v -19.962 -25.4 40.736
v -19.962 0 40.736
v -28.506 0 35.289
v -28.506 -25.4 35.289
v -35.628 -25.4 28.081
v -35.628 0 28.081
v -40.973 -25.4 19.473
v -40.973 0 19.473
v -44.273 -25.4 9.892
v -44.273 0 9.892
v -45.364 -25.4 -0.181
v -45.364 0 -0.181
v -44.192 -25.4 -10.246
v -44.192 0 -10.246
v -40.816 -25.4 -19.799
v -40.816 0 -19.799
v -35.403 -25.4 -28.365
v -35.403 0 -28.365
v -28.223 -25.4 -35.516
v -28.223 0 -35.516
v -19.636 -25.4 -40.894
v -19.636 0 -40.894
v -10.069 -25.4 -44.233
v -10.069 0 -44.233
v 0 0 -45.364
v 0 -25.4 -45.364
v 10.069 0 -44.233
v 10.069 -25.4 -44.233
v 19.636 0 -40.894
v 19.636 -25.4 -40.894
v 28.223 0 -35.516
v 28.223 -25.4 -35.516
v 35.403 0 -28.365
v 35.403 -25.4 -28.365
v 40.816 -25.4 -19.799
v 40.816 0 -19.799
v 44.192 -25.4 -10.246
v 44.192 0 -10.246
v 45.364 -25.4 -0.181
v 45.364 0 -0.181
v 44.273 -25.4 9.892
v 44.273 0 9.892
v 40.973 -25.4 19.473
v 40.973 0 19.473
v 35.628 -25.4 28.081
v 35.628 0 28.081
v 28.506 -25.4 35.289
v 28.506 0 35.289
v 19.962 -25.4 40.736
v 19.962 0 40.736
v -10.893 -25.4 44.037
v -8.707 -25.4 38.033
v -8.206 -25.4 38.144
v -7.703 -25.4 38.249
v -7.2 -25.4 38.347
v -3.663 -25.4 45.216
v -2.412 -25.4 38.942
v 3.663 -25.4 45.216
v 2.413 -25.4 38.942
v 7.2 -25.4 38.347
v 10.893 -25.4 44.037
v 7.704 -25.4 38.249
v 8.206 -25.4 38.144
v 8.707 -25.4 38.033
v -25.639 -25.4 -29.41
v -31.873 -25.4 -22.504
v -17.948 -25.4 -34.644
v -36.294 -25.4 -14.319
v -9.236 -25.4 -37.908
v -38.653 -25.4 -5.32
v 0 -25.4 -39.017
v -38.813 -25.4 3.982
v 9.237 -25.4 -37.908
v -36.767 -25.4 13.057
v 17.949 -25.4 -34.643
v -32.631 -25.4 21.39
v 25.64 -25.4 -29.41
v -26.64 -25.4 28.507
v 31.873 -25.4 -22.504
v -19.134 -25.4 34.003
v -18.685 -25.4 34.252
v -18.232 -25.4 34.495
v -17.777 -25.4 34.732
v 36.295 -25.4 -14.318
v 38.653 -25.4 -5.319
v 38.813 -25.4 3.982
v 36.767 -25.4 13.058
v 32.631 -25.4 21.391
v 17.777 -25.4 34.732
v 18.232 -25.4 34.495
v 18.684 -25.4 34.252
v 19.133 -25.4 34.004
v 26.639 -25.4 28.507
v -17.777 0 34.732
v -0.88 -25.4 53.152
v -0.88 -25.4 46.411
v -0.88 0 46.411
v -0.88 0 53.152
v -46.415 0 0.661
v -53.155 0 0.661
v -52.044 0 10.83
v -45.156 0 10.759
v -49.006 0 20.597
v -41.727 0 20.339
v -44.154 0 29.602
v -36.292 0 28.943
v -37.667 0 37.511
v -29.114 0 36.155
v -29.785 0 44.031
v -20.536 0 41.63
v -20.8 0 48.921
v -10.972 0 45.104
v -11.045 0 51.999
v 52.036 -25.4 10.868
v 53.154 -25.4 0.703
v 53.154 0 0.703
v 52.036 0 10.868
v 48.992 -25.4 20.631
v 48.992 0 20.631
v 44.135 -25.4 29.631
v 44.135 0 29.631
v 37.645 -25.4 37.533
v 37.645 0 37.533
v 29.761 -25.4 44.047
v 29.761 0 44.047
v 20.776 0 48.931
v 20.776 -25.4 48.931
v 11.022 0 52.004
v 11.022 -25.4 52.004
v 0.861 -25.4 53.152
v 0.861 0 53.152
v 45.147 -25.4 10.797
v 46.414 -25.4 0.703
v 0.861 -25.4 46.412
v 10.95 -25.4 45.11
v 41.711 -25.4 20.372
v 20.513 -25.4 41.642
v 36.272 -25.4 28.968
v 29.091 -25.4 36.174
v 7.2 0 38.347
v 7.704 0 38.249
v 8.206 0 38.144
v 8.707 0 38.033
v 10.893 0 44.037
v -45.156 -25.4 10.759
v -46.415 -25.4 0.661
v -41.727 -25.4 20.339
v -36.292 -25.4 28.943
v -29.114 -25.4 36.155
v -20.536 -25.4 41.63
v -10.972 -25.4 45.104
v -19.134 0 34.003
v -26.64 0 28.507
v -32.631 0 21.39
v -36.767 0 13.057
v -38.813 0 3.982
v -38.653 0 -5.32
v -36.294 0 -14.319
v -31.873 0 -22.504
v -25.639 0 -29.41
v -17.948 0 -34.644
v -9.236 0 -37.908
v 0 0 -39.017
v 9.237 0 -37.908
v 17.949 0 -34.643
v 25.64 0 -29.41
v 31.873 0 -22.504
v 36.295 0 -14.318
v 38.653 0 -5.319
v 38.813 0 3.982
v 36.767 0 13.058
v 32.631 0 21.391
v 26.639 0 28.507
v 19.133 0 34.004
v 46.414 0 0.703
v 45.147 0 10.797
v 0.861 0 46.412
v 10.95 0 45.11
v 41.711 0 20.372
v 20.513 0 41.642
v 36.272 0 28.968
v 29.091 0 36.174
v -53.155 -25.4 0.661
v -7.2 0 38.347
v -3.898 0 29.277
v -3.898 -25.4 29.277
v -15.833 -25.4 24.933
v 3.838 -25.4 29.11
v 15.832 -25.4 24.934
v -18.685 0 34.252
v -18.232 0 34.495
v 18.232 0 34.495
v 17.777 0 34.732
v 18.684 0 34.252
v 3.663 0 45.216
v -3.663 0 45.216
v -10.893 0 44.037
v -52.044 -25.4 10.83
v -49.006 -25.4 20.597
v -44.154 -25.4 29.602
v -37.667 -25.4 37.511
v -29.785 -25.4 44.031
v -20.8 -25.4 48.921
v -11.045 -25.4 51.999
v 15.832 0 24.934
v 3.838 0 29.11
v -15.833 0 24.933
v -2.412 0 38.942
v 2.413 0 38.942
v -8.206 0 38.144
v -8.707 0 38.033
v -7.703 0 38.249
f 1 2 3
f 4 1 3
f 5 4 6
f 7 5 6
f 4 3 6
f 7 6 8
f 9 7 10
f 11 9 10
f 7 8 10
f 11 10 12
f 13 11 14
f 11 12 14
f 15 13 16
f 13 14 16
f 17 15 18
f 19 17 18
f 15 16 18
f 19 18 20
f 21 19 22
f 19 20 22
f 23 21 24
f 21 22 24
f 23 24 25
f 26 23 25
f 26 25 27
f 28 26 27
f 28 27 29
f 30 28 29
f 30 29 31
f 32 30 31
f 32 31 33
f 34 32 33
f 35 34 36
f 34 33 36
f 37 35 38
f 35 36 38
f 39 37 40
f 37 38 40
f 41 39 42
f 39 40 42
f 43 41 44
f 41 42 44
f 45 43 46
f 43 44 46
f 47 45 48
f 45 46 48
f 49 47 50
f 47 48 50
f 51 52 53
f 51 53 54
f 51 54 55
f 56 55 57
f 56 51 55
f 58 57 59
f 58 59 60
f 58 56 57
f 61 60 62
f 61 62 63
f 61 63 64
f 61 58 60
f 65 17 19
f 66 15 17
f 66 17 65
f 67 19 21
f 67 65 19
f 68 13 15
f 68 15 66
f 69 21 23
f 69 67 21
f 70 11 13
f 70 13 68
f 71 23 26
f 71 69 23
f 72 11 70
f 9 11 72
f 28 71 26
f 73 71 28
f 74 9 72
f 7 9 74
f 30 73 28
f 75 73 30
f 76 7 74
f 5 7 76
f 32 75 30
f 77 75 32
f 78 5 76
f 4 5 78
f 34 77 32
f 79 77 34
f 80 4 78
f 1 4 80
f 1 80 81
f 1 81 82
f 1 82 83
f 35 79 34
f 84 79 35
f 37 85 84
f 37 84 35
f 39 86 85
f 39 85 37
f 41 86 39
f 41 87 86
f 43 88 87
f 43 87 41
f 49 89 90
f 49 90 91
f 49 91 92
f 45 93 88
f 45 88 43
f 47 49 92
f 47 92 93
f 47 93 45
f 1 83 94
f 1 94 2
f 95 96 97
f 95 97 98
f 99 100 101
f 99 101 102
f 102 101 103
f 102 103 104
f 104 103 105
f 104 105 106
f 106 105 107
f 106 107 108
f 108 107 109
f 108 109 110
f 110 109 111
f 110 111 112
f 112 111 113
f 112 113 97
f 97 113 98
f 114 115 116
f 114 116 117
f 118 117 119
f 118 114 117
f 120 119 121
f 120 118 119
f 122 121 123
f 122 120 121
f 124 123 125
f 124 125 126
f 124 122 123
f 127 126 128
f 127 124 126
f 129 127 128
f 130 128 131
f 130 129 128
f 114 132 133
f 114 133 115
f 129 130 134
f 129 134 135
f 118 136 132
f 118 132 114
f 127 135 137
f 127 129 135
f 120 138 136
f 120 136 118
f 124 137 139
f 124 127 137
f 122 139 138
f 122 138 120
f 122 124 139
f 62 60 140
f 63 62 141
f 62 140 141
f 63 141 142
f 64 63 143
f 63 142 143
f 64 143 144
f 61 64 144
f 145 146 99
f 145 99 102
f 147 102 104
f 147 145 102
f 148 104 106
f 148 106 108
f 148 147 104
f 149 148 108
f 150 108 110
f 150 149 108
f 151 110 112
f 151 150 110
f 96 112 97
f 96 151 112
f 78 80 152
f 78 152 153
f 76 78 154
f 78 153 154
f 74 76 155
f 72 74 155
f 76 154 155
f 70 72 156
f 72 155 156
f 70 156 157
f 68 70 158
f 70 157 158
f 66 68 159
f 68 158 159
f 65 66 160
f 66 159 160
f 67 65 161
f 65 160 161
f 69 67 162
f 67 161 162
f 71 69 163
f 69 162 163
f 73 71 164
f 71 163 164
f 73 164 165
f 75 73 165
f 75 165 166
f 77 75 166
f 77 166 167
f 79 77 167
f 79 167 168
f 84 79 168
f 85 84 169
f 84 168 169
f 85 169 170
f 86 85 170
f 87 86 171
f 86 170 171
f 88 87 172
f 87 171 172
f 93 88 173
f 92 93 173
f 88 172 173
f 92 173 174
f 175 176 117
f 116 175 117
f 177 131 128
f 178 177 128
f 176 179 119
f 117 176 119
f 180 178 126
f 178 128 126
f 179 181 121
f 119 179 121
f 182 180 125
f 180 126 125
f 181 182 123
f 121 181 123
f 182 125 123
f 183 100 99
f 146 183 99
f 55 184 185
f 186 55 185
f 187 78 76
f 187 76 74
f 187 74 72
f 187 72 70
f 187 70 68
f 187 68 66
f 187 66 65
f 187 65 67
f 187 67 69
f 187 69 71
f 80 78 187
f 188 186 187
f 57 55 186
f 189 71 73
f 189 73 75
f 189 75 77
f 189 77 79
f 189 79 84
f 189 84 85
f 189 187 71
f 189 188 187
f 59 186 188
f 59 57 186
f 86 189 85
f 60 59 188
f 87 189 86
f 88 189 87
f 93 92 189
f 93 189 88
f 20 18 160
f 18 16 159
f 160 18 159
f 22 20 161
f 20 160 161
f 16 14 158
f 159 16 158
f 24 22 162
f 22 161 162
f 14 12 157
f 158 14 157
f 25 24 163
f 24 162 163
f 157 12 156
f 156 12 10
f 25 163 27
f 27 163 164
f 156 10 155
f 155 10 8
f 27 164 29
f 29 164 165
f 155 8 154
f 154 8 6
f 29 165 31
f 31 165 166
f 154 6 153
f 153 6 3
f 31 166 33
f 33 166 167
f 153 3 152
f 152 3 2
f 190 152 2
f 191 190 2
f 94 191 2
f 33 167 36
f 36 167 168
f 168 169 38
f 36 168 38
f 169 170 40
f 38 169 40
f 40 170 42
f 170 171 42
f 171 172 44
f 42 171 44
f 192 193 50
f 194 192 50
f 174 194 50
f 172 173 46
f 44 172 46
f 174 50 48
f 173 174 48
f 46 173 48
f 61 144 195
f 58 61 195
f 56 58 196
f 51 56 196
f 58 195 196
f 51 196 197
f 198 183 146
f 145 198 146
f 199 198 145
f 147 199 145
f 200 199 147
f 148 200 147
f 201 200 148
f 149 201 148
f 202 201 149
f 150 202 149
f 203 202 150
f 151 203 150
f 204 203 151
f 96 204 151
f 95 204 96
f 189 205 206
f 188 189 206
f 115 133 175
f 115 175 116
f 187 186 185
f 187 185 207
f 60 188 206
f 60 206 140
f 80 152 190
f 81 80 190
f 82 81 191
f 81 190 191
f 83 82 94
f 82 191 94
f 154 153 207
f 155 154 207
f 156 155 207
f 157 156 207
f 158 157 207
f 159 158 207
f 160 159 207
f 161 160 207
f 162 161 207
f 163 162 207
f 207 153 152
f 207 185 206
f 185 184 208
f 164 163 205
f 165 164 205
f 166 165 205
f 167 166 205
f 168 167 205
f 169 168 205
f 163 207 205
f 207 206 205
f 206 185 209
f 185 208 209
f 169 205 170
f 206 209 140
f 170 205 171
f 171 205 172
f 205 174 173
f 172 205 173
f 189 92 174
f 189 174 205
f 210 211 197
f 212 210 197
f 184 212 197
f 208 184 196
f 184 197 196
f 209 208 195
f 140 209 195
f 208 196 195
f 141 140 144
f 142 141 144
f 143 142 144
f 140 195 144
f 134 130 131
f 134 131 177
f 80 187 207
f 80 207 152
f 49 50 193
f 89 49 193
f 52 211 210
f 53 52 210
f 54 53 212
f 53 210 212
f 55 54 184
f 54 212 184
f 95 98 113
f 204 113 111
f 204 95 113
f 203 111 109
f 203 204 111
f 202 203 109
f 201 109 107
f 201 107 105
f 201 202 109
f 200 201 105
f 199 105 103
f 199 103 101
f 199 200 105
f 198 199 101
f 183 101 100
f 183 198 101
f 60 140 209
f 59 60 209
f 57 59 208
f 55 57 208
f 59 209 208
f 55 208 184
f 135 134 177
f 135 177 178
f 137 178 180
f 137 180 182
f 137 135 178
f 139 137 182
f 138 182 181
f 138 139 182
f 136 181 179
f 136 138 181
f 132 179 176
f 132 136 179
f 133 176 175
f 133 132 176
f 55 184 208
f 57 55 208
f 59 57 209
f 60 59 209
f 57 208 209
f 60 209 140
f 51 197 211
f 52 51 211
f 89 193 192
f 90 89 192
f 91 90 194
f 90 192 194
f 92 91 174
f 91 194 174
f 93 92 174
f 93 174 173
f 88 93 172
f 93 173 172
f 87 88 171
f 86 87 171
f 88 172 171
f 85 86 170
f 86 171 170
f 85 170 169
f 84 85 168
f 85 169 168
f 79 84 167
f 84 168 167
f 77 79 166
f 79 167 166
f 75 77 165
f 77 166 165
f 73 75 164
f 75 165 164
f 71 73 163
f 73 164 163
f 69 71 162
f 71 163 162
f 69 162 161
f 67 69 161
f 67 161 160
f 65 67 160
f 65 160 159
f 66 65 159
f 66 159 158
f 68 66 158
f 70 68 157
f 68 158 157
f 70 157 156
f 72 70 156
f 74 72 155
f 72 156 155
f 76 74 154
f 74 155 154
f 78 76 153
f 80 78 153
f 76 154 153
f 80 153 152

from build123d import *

# Parameters (mm, degrees)
F1_DEPTH = 25.4
F3_DEPTH = 25.4
F5_DEPTH = 25.4
F6_DEPTH = 25.4


with BuildPart() as f1:
    # F0 (on Front) → F1 (new body)
    with BuildSketch(Plane.XZ):
        with BuildLine():
            ThreePointArc((-8.707147, 38.032969), (-7.954928, 38.197385), (-7.199611, 38.346926))
            ThreePointArc((-7.199611, 38.346926), (0.000315, 39.016934), (7.20023, 38.34681))
            ThreePointArc((7.20023, 38.34681), (7.955236, 38.197321), (8.707147, 38.032969))
            Line((8.707147, 38.032969), (10.892535, 44.037274))
            ThreePointArc((10.892535, 44.037274), (0, 45.3644), (-10.892535, 44.037274))
            Line((-10.892535, 44.037274), (-8.707147, 38.032969))
        make_face()
        with BuildLine():
            Line((-17.77706, 34.731791), (-19.962448, 40.736095))
            ThreePointArc((-19.962448, 40.736095), (0, -45.3644), (19.962448, 40.736095))
            Line((19.962448, 40.736095), (17.77706, 34.731791))
            ThreePointArc((17.77706, 34.731791), (18.4587, 34.374373), (19.133158, 34.003579))
            ThreePointArc((19.133158, 34.003579), (0.000315, -39.016934), (-19.133707, 34.00327))
            ThreePointArc((-19.133707, 34.00327), (-18.458978, 34.374224), (-17.77706, 34.731791))
        make_face()
    extrude(amount=F1_DEPTH)


with BuildPart() as f3:
    # F2 (on face) → F3 (new body)
    with BuildSketch(Plane.XZ):
        with BuildLine():
            Line((-3.898432, 29.277013), (-15.832529, 24.933357))
            Line((-15.832529, 24.933357), (-19.133707, 34.00327))
            ThreePointArc((-19.133707, 34.00327), (0.000315, -39.016934), (19.133158, 34.003579))
            Line((19.133158, 34.003579), (15.83198, 24.933666))
            Line((15.83198, 24.933666), (3.838281, 29.10993))
            Line((3.838281, 29.10993), (7.20023, 38.34681))
            ThreePointArc((7.20023, 38.34681), (0.000315, 39.016934), (-7.199611, 38.346926))
            Line((-7.199611, 38.346926), (-3.898432, 29.277013))
        make_face()
    extrude(amount=F3_DEPTH)


with BuildPart() as f5:
    # F4 (on face) → F5 (new body)
    with BuildSketch(Plane.XZ.offset(25.4)):
        with BuildLine():
            ThreePointArc((-46.415114, 0.660894), (-32.901321, 32.746033), (-0.880474, 46.411468))
            Line((-0.880474, 46.411468), (-0.880474, 53.151636))
            ThreePointArc((-0.880474, 53.151636), (-37.6666, 37.511317), (-53.15482, 0.660894))
            Line((-53.15482, 0.660894), (-46.415114, 0.660894))
        make_face()
    extrude(amount=-F5_DEPTH)


with BuildPart() as f6:
    # F4 (on face) → F6 (new body)
    with BuildSketch(Plane.XZ.offset(25.4)):
        with BuildLine():
            ThreePointArc((53.154275, 0.703382), (37.644585, 37.53341), (0.86059, 53.151962))
            Line((0.86059, 53.151962), (0.86059, 46.411841))
            ThreePointArc((0.86059, 46.411841), (32.879311, 32.768133), (46.41449, 0.703382))
            Line((46.41449, 0.703382), (53.154275, 0.703382))
        make_face()
    extrude(amount=-F6_DEPTH)


solid = Compound([f1.part, f3.part, f5.part, f6.part])
